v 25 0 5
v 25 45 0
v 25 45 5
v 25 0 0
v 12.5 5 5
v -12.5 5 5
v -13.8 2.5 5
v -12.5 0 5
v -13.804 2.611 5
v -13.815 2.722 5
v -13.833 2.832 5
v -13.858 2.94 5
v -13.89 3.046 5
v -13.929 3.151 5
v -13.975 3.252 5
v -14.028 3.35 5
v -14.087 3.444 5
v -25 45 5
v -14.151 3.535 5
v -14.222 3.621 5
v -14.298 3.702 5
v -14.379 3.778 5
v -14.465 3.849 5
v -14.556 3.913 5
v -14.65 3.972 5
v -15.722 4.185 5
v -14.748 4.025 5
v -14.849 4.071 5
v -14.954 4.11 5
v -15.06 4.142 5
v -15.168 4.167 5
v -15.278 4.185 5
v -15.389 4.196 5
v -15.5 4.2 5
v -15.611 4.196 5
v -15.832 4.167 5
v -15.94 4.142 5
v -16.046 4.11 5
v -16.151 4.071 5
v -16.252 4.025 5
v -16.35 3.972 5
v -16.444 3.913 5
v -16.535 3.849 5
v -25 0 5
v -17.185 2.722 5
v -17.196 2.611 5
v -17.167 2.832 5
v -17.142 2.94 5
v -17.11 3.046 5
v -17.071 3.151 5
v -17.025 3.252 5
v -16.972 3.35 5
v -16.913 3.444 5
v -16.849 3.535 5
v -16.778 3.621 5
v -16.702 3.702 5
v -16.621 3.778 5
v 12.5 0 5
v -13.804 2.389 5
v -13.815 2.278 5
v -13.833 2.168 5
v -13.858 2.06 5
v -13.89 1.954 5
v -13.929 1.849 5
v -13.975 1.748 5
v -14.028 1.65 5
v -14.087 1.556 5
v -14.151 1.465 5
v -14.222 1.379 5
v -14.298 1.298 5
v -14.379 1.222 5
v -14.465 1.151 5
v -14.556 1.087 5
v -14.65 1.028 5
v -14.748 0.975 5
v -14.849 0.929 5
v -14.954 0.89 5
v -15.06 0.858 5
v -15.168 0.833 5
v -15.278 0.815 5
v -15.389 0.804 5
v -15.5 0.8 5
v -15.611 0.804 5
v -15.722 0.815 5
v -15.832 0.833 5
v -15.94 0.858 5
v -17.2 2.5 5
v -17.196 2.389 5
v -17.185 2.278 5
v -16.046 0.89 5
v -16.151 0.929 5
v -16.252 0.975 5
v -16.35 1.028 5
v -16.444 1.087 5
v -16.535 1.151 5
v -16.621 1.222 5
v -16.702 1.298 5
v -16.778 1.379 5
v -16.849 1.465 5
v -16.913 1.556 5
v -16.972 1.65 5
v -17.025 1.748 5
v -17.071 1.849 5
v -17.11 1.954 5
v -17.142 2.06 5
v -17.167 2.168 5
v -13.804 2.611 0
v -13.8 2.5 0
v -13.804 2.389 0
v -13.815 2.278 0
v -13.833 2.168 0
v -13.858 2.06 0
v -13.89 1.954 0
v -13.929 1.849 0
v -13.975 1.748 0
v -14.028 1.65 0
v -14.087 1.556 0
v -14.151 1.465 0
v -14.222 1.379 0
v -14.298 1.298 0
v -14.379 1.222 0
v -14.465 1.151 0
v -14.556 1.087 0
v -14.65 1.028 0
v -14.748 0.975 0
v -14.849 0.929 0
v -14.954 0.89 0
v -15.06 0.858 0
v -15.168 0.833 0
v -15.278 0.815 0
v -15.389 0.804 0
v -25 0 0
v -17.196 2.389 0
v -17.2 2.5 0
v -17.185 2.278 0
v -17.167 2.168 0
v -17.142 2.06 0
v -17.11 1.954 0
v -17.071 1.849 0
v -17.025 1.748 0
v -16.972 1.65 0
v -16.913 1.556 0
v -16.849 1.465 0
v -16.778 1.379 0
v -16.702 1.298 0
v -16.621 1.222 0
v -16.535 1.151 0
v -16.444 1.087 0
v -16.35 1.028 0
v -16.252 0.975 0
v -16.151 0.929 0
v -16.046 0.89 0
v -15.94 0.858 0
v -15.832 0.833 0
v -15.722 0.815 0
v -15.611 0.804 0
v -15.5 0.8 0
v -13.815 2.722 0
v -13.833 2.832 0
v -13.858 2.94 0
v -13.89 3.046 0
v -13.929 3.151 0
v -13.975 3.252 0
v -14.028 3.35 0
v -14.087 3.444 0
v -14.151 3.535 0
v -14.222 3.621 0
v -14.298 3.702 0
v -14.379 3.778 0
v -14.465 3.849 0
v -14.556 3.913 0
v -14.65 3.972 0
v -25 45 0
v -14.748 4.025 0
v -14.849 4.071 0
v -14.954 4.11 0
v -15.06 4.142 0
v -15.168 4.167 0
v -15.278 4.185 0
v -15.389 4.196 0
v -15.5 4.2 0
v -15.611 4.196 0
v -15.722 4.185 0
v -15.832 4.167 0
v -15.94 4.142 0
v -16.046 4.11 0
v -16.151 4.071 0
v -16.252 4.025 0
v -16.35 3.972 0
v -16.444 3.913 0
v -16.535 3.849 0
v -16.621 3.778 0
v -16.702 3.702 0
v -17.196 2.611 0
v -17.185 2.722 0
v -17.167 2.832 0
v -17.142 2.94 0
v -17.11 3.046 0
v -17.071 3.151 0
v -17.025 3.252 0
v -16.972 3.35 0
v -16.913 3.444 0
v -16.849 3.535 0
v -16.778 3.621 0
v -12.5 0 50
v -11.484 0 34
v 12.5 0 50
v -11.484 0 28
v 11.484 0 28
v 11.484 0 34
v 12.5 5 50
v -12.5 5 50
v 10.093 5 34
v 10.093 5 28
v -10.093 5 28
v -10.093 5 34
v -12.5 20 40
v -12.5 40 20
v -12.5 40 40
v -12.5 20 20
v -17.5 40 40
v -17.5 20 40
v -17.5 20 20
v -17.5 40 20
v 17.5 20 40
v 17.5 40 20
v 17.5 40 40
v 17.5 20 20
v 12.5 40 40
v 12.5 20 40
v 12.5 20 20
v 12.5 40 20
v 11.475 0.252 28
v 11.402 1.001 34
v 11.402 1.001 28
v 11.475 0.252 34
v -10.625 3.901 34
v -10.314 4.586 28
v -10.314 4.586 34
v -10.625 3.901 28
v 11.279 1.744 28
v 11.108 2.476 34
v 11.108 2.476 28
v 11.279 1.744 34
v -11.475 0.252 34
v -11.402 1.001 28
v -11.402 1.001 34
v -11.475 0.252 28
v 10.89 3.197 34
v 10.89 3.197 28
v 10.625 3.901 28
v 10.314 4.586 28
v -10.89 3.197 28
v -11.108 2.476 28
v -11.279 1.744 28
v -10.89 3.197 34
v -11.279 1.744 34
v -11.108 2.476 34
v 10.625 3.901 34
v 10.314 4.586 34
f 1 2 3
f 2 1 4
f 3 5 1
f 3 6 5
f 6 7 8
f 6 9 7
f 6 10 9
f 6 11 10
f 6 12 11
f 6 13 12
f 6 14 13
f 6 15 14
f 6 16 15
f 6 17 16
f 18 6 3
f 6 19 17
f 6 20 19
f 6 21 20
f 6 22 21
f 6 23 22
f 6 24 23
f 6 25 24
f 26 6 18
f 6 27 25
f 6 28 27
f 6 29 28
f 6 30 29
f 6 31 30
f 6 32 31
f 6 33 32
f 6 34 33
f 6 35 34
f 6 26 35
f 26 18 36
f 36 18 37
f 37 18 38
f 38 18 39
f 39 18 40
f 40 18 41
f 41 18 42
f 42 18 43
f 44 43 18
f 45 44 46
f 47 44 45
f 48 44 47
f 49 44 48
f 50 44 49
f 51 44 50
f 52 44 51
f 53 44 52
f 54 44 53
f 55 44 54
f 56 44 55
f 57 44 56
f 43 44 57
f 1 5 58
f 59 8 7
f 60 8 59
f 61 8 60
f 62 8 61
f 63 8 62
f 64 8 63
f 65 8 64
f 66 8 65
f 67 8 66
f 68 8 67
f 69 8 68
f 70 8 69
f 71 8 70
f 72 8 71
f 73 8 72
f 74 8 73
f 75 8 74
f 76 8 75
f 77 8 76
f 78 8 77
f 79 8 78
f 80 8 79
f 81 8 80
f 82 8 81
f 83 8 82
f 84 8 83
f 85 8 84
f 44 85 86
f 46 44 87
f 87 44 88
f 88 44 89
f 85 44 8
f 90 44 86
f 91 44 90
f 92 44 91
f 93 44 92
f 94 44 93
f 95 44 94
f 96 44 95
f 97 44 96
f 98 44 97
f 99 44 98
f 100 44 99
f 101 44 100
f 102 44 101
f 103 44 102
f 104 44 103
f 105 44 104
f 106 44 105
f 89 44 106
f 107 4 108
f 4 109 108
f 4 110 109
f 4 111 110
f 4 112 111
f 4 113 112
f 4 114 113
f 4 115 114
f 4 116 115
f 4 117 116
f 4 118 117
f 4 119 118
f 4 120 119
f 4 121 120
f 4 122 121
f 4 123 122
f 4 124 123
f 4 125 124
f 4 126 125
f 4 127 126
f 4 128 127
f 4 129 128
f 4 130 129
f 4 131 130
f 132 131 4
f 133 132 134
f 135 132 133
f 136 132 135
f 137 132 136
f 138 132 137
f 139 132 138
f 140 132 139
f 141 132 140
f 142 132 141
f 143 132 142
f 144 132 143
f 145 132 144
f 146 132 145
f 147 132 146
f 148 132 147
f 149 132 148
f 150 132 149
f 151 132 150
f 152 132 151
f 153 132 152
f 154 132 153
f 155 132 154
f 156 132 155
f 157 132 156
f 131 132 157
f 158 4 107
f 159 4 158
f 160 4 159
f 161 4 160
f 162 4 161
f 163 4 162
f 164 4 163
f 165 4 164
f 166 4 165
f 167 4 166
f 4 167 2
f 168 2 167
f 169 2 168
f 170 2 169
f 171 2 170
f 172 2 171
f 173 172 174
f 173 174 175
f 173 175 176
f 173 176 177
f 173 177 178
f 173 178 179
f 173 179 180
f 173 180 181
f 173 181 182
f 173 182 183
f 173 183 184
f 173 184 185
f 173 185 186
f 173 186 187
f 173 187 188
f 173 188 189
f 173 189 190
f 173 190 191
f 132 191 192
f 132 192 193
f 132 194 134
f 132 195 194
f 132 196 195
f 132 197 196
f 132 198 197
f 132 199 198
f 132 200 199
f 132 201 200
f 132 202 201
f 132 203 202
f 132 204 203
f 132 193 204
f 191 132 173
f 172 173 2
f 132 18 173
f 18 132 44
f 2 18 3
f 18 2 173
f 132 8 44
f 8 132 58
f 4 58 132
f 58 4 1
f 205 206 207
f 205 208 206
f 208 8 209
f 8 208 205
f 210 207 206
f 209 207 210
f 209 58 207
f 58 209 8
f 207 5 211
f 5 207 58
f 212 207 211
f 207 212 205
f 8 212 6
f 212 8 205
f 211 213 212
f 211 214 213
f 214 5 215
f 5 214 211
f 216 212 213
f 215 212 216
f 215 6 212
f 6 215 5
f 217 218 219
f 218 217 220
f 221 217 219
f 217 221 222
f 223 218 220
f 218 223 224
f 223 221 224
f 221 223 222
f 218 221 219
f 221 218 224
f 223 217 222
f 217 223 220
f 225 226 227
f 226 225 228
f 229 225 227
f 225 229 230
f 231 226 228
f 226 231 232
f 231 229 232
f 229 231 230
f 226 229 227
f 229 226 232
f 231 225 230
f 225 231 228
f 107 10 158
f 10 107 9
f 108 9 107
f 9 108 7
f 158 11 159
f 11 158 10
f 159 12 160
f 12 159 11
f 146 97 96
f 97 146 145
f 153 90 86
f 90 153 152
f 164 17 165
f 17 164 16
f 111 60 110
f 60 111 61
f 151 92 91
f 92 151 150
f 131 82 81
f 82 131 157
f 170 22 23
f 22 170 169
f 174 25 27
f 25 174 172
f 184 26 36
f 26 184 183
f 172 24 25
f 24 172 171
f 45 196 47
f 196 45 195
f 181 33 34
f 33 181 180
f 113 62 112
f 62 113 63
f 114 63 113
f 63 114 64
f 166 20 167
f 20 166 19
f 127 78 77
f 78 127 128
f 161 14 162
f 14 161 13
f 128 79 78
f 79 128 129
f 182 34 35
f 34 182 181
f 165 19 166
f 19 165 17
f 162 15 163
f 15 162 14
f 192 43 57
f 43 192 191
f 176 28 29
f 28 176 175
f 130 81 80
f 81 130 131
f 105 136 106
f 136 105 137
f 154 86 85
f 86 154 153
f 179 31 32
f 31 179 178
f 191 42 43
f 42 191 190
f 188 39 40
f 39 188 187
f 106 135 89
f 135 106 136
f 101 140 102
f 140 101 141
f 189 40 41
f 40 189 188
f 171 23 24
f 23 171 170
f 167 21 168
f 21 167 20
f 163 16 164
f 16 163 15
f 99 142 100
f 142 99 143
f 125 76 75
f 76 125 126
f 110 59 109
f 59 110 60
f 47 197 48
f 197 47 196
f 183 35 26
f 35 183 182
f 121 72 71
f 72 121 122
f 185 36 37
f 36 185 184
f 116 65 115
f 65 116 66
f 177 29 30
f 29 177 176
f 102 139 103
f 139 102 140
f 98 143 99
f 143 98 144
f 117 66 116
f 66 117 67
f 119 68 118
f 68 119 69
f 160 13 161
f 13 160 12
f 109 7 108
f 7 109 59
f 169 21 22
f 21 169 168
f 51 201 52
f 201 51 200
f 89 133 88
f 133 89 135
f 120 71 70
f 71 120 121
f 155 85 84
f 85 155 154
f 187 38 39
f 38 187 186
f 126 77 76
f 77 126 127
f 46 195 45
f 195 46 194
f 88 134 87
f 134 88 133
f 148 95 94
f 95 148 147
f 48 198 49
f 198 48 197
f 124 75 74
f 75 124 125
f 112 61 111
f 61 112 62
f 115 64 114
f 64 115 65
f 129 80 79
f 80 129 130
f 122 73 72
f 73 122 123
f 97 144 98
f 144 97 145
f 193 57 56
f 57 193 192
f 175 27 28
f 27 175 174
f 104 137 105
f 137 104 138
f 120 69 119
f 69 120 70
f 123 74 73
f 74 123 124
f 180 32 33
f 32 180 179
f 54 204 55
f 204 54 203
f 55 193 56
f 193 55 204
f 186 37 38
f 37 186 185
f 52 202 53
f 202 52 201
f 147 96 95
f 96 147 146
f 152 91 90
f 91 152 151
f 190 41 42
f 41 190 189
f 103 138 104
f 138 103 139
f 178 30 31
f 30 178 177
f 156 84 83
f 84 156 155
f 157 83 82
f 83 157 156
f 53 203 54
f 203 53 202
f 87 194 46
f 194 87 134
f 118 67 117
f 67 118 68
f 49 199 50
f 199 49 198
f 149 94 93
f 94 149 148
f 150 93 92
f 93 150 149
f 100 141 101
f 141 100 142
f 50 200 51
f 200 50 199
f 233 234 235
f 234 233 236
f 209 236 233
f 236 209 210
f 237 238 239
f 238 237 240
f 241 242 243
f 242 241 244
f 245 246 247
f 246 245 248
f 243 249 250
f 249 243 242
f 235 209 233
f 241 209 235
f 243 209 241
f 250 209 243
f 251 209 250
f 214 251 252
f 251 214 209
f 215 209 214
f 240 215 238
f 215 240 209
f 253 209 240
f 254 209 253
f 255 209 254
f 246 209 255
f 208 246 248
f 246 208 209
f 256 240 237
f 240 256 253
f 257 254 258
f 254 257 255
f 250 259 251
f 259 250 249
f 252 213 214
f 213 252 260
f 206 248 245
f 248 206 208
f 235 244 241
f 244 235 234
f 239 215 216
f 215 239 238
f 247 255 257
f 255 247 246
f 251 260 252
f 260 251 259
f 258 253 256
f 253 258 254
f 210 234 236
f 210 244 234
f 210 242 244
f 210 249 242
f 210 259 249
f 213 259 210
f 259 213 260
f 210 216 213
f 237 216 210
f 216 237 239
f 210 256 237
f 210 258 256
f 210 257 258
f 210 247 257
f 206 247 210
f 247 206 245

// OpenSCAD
// L-shaped mounting bracket for NEMA 17 stepper motor (e.g. syringe pump)
// Print orientation: base plate on bed, vertical plate builds up in +Z

// ---------- Parameters ----------
base_x      = 50;    // base plate length in X (-25 to +25)
base_y      = 45;    // base plate width in Y (0 to 45)
base_t      = 5;     // base plate thickness in Z

hole_m4_x   = -17;   // M4 hole centre X (left)
hole_m4_y   = 30;    // M4 hole centre Y
hole_m4_x2  = 17;    // M4 hole centre X (right)

motor_x     = 25;    // motor plate length in X (-25 to +25)
motor_y     = 5;     // motor plate width in Y (0 to 5)
motor_z     = 50;    // motor plate height in Z

boss_d      = 23;    // motor centring boss hole diameter
boss_x      = 0;     // boss hole centre X
boss_z      = 28;    // boss hole centre Z

screw_d     = 3.4;   // M3 screw hole diameter
screw_pitch = 31;    // square pattern side length
screw_n     = 4;     // number of screw holes

gusset_t    = 5;     // gusset thickness in X
gusset_y    = 20;    // gusset leg along +Y
gusset_z    = 20;    // gusset leg along +Z

eps         = 0.5;   // cutter overshoot past faces
$fn         = 96;    // curve resolution

// ---------- Model ----------
difference() {
    union() {
        // Base plate
        translate([-base_x/2, 0, 0])
            cube([base_x, base_y, base_t]);

        // Vertical motor plate
        translate([-motor_x/2, 0, 0])
            cube([motor_x, motor_y, motor_z]);

        // Left gusset (right-angle corner at y=5, z=5)
        translate([-motor_x/2 - gusset_t, gusset_y, gusset_z])
            cube([gusset_t, gusset_y, gusset_z]);

        // Right gusset (right-angle corner at y=5, z=5)
        translate([motor_x/2, gusset_y, gusset_z])
            cube([gusset_t, gusset_y, gusset_z]);
    }

    // Base plate through-holes (M4)
    for (hx = [hole_m4_x, hole_m4_x2])
        translate([hx, hole_m4_y, -eps])
            cylinder(d = hole_m4_x, h = base_t + 2*eps);

    // Motor plate boss hole (along Y)
    translate([boss_x, -eps, boss_z])
        cylinder(d = boss_d, h = motor_y + 2*eps);

    // M3 screw holes on square pattern, centred on boss hole
    for (i = [0 : screw_n - 1]) {
        a = screw_pitch / 2;
        x = (i % 2 == 0) ? -a : a;
        z = (i / 2 == 0) ? -a : a;
        translate([x, motor_y/2, z])
            cylinder(d = screw_d, h = motor_z + 2*eps);
    }
}
